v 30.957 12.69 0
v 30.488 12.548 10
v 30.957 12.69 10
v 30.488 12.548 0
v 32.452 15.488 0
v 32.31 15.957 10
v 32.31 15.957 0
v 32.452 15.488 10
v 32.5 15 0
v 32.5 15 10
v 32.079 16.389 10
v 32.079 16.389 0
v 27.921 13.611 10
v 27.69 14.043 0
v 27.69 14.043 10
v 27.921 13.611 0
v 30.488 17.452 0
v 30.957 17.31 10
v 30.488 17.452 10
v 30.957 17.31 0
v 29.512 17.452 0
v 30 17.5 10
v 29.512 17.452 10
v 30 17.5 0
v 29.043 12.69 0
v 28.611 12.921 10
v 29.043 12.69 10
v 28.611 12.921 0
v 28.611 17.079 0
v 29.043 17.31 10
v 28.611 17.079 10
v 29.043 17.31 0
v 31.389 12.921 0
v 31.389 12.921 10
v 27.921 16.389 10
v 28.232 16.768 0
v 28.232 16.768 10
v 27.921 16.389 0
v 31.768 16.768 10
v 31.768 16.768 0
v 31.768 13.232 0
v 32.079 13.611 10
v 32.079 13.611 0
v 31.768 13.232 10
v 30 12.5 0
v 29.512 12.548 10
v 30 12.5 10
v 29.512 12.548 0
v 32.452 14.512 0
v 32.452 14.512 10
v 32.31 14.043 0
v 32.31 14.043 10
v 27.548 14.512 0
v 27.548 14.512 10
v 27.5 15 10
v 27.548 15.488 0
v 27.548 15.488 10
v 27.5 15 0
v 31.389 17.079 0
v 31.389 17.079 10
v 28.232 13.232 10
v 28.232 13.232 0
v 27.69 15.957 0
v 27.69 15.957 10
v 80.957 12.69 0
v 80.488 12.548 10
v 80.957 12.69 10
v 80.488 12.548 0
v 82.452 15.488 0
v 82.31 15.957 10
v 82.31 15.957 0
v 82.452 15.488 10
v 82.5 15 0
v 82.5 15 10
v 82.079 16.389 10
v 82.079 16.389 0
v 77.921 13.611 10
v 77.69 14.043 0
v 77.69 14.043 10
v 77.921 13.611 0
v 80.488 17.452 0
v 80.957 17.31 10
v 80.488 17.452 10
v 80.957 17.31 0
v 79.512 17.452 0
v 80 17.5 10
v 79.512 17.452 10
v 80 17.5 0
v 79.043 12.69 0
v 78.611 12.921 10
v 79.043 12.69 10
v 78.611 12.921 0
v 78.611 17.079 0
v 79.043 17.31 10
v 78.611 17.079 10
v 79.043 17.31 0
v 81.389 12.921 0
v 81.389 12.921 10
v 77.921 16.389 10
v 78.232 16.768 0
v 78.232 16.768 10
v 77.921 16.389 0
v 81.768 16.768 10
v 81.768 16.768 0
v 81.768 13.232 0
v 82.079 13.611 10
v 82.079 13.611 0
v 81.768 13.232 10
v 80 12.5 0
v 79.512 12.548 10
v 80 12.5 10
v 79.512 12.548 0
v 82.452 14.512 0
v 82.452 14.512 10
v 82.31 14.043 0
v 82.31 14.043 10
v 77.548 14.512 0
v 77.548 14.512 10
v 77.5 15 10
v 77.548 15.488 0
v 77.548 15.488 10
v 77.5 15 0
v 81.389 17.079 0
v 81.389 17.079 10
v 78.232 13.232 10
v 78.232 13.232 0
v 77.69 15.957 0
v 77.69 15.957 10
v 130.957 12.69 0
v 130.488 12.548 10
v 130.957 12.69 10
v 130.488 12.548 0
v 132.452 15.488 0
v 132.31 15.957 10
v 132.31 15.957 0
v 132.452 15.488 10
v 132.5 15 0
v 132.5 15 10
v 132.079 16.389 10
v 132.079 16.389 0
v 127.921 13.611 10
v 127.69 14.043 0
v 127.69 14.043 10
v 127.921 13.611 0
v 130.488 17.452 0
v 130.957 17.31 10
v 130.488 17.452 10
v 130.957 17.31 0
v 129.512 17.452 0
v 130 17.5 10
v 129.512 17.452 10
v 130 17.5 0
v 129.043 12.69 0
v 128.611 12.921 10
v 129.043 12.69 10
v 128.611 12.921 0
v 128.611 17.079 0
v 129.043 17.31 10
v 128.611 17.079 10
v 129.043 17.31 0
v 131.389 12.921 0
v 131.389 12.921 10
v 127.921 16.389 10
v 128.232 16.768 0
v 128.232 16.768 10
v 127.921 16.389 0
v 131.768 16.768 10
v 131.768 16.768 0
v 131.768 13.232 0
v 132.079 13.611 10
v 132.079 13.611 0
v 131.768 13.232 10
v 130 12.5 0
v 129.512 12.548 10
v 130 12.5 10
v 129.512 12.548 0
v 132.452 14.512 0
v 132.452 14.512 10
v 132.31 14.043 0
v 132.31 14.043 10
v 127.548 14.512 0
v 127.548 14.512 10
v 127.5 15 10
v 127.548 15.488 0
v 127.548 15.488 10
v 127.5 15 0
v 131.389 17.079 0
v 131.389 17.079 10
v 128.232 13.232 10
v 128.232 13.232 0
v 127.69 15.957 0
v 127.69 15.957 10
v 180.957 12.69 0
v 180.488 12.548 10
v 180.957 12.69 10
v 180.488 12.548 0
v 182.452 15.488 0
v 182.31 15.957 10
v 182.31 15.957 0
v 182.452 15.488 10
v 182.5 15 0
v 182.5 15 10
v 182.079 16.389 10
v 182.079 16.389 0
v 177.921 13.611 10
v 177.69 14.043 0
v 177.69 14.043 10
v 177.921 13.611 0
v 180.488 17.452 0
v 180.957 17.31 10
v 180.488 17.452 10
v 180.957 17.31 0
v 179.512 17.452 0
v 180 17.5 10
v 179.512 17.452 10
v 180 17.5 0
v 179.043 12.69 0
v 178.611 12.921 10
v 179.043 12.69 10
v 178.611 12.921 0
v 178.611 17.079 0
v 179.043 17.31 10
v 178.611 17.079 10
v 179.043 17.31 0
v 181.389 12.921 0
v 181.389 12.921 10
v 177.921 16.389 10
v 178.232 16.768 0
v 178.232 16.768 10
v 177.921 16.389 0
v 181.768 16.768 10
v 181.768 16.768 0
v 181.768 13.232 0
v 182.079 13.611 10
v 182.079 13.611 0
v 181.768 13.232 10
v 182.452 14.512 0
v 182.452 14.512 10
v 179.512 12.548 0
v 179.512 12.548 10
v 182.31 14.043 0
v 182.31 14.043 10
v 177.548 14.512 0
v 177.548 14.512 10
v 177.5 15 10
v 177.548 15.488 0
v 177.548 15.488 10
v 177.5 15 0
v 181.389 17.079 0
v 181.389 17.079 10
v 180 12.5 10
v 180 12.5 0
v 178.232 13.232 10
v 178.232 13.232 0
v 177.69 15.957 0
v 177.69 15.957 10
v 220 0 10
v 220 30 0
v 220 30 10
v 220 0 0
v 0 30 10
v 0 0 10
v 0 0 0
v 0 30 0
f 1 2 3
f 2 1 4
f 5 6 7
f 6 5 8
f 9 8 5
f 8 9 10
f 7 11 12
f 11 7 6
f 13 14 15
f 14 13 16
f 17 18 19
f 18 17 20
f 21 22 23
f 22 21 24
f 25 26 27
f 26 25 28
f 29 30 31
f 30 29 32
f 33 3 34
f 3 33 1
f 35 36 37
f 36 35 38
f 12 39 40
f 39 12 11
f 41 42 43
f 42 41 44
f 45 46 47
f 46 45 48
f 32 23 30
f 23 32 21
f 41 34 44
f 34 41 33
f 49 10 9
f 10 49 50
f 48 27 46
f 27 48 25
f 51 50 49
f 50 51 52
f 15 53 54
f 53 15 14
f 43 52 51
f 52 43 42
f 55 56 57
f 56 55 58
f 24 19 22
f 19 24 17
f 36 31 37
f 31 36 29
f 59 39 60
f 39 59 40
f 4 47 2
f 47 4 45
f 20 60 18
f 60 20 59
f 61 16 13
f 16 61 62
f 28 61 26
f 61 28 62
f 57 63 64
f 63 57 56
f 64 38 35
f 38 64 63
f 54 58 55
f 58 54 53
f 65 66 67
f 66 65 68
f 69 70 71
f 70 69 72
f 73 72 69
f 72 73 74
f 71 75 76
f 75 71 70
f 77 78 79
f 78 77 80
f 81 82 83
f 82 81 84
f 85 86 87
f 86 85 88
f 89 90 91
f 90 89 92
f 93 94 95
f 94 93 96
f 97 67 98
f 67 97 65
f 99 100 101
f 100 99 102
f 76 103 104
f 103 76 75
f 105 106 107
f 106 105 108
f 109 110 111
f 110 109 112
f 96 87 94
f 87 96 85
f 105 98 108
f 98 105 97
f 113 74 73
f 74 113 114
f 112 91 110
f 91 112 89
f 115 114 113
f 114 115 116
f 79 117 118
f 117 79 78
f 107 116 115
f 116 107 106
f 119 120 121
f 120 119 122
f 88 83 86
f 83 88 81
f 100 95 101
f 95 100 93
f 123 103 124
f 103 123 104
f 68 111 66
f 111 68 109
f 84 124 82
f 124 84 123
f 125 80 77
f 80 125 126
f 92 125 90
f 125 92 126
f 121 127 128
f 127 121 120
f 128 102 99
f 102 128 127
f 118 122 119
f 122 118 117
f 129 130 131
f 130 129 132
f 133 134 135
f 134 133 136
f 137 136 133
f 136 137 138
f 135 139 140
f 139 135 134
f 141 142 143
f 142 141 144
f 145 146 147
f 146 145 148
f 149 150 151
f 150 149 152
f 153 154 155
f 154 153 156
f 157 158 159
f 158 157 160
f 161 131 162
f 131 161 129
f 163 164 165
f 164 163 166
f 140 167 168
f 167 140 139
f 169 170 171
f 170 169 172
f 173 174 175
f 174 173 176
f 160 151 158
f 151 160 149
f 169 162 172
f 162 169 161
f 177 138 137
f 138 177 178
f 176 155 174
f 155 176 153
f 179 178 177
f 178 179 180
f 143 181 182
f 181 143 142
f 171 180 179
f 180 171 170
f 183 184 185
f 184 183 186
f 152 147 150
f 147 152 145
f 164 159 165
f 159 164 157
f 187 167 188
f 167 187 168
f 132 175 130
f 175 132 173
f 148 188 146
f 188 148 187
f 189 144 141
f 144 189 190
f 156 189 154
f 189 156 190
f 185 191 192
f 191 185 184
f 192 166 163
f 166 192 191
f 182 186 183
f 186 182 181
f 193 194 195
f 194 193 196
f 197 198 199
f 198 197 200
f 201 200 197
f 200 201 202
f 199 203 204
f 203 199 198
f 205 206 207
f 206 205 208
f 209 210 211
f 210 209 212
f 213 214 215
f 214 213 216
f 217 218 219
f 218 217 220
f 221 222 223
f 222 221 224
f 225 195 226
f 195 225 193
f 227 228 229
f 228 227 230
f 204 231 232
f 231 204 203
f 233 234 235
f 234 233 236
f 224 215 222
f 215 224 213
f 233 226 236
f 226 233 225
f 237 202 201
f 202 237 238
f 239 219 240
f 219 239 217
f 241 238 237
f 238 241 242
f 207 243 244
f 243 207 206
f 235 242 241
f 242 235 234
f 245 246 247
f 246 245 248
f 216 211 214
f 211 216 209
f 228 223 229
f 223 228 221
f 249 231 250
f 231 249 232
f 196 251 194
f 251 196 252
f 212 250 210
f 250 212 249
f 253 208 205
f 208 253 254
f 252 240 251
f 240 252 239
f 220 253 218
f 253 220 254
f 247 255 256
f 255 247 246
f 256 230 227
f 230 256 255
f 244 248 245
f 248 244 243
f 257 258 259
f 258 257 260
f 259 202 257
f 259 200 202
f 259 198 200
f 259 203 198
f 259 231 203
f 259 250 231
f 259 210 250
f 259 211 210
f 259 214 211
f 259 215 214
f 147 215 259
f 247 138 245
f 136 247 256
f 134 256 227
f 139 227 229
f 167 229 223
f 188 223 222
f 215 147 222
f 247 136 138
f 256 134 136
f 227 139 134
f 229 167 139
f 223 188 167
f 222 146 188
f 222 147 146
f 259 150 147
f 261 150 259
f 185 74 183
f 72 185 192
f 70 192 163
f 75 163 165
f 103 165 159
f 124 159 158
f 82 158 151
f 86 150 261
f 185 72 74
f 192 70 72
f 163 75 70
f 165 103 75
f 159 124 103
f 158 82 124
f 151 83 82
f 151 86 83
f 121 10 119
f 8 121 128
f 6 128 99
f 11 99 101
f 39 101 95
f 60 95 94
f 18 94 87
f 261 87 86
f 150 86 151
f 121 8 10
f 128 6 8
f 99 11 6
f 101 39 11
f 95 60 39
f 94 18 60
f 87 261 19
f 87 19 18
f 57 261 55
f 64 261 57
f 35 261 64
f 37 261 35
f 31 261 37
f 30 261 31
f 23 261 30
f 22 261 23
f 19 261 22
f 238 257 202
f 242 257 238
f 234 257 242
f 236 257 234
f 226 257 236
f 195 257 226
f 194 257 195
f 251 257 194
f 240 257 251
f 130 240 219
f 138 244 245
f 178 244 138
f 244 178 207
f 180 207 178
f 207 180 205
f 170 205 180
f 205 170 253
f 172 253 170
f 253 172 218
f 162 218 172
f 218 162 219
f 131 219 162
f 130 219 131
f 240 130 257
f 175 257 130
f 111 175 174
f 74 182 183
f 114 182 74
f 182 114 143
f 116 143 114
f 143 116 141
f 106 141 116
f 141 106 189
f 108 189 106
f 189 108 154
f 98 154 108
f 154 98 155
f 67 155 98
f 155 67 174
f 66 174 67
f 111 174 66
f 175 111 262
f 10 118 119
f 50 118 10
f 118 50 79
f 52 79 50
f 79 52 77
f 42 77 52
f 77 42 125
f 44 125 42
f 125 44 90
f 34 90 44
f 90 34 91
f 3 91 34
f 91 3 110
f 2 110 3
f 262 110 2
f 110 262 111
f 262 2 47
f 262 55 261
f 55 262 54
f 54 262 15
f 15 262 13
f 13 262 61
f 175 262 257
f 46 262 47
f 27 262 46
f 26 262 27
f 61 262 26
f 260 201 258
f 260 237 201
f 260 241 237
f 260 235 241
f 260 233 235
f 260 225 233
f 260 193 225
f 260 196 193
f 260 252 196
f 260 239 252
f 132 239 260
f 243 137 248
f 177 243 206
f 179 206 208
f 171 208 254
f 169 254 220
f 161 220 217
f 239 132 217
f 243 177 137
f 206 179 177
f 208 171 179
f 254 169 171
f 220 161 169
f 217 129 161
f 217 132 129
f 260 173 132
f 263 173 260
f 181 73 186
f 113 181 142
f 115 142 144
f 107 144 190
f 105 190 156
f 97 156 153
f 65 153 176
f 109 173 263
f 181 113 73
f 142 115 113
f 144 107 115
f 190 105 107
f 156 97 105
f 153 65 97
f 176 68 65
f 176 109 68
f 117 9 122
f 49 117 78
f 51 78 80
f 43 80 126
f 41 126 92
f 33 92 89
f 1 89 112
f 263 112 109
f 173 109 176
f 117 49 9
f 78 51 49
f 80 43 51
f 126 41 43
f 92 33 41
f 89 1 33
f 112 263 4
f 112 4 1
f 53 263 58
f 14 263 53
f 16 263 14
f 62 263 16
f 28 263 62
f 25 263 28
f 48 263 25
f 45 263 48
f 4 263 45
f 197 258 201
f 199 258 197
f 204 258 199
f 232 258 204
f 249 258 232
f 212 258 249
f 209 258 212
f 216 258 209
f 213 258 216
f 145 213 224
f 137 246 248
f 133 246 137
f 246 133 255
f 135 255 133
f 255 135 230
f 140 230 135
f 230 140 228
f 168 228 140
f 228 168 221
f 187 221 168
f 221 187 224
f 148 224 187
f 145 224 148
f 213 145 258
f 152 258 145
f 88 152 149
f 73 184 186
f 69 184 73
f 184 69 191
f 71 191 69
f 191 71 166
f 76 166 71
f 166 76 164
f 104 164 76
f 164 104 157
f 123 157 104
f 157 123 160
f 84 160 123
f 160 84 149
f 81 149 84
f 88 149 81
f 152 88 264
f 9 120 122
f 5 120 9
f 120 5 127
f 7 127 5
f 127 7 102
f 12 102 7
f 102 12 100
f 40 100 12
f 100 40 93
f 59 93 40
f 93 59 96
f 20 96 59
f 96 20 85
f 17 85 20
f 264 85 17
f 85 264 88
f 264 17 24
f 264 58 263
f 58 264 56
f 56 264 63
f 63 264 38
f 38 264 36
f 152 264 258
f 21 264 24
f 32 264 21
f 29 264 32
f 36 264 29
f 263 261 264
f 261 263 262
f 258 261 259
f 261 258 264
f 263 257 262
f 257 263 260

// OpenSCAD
$fn = 32;

// ----------------------------------------------------------------------
// Long rail: 200-250 mm mounting rail
// ----------------------------------------------------------------------

// --- parameters (mm) ---
rail_l = 220;             // rail length, X
rail_w = 30;              // rail width, Y
rail_t = 10;              // rail thickness, Z
hole_d = 5;               // mounting hole diameter
hole_start = 30;          // first hole offset from the end
hole_pitch = 50;          // hole pitch
holes = 4;                // number of holes
fit_tol = 0.05;           // tolerance for press fits, mm
free_tol = 0.3;           // tolerance for clearance fits, mm

difference() {
  cube([rail_l, rail_w, rail_t]);
  for (i = [0 : holes - 1])
    translate([hole_start + i * hole_pitch, rail_w / 2, -1])
      cylinder(h = rail_t + 2, d = hole_d);
}
